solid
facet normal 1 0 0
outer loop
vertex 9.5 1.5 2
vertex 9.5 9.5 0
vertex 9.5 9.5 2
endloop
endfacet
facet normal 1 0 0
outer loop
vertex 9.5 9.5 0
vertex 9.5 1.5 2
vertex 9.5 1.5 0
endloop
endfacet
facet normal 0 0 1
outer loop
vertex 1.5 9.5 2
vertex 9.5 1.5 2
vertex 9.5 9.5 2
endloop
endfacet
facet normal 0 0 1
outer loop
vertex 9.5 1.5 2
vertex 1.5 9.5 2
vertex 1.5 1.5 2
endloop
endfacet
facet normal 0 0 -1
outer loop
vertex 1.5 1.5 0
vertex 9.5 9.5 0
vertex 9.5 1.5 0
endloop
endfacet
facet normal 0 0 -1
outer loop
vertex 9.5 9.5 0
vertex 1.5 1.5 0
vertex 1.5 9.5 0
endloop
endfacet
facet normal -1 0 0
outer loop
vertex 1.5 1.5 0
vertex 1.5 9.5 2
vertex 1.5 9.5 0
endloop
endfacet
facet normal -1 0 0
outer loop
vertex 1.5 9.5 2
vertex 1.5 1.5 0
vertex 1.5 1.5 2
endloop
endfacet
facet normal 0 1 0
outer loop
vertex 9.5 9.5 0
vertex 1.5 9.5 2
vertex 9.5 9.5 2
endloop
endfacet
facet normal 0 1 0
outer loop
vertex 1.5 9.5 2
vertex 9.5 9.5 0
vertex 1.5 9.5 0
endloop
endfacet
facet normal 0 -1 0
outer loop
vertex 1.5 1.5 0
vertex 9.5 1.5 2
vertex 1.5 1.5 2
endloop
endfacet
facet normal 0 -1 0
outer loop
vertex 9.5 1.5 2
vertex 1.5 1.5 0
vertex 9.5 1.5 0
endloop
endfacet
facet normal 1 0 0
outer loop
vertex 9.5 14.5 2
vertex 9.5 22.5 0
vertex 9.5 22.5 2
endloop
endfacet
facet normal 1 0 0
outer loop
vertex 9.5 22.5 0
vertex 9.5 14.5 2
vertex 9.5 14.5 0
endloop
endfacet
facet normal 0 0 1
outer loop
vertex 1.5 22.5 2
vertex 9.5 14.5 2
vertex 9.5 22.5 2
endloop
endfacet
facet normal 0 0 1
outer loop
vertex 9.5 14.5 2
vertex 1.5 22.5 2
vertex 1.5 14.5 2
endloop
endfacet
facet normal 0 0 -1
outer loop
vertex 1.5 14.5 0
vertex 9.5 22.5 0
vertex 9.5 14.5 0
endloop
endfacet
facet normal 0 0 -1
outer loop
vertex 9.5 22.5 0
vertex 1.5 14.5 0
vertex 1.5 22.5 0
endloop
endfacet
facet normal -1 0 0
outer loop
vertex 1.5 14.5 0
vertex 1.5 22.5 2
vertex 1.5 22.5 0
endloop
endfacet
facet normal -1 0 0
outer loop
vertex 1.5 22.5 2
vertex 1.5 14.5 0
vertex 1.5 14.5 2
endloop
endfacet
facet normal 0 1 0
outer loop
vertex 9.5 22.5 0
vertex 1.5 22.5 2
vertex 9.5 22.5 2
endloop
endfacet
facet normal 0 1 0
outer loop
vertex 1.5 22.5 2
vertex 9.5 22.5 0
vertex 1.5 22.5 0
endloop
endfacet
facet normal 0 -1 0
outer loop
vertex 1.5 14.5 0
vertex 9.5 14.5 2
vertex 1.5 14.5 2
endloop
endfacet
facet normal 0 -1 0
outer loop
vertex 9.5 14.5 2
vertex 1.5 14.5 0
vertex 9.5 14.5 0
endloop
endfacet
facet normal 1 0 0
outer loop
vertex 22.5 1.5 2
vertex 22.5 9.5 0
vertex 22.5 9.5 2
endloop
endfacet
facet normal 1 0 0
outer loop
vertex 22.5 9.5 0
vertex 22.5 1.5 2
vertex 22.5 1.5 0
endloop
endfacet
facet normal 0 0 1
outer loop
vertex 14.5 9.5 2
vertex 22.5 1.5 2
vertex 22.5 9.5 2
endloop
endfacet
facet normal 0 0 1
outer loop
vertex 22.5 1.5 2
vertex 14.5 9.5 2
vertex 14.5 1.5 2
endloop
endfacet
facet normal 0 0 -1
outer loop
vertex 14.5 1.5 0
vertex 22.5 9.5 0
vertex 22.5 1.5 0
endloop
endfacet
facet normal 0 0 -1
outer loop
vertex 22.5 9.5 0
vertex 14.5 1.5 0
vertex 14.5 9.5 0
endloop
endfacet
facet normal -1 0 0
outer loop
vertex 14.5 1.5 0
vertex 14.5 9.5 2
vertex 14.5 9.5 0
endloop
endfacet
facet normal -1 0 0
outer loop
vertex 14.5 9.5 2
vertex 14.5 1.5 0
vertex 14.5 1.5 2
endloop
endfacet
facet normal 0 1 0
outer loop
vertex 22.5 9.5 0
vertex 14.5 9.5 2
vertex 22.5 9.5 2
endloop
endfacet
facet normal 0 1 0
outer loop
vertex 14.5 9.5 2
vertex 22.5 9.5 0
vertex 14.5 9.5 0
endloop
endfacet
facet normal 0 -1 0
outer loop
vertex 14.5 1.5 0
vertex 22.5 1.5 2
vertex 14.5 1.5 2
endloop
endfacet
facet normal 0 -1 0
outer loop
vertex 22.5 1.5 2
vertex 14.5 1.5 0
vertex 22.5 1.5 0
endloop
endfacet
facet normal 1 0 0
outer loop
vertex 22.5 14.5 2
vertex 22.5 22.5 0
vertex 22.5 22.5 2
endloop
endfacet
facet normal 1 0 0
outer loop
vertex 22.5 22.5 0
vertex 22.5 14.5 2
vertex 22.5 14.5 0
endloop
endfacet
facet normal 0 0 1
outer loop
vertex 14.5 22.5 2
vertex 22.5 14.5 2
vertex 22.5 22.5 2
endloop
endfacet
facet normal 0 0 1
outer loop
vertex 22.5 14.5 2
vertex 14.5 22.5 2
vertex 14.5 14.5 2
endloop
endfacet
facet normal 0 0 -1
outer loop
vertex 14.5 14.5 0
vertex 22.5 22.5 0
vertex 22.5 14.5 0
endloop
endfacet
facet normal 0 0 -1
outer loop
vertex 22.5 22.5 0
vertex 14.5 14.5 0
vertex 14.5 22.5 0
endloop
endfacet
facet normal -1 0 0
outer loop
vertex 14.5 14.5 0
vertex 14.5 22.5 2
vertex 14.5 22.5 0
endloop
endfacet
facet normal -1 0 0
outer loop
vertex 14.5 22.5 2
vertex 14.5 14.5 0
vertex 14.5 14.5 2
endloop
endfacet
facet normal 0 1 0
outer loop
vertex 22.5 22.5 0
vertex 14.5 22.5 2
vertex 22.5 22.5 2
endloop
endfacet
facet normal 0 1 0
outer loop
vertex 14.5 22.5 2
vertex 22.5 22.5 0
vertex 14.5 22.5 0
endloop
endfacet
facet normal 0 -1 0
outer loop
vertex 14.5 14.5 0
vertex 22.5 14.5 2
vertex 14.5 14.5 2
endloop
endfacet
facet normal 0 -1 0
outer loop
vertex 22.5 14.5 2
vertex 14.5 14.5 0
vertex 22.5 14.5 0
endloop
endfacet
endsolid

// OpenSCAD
// file: ../lib/util/util_functions.scad
include <../config/constants.scad>

function sum(v) = [for(p = v) 1] * v;

function take_sum(v, i) = i == 0 
  ? 0 
  : sum([for(a=[0:i-1]) v[a]]);

// input : nested list
// output : list with the outer level nesting removed
function flatten(outter_vector) = [for(inner_vector=outter_vector) for(item=inner_vector) item];
// file: ../lib/layout/layout.scad
include <../config/constants.scad>
include <../util/util_functions.scad>

function padded_rect(size) = size + (
  size[2] == undef
    ? [$padding * 2, $padding * 2]
    : [$padding * 2, $padding * 2, 0]
);

function padded_cube(size) = size + [$padding * 2, $padding * 2, $padding * 2];

function stack_height (length, count=1, top_padding=$top_padding) = length * count + top_padding;

function padded_offset (length, index=1) = (length + $padding * 2 + $wall_thickness) * index;

function offset (size, index=1) = (size + $wall_thickness) * index;

function pad(length) = length + $padding * 2;
function padded_list_length(list) = sum(
  [for(i=[0:len(list)-1]) list[i] + $padding * 2 + $wall_thickness]
) + $wall_thickness;

function divide_rect(rect, operand) = rect[2] == undef
  ? [rect[0] / operand, rect[1] / operand]
  : [rect[0] / operand, rect[1] / operand, rect[2]];

function multiply_rect(rect, operand) = [rect[0] * operand, rect[1] * operand];

function divide_cube(rect, operand) = [rect[0] / operand, rect[1] / operand, rec[2] / operand];
function multiply_cube(rect, operand) = [rect[0] * operand, rect[1] * operand, rect[2] * operand];

function offset_centre_in_box(size, bounding_box) = divide_rect(bounding_box - size, 2);

function spin_orientation_size(size, orientation=1) = orientation % 2 == 0
  ? size
  : [
    size[1],
    size[0],
    size[2],
  ];

// TODO add support for orientation 3
function spin_orientation_offset(size, orientation=1) = [
  orientation == 2 ? -size[0]: 0,
  orientation == 1 ? -size[0]: (orientation == 2 ? -size[1]: 0),
  0,
];

module spin_orientation(size, orientation=1) {
  assert(orientation >= 0, "Invalid orientation [0, 1, 2, 3] required");
  assert(orientation < 3, "Invalid orientation [0, 1, 2, 3] required");

  rotated_size = spin_orientation_size(size, orientation=1);
  degrees = 90 * orientation;
  spin_offset = spin_orientation_offset(size, orientation);

  rotate([0, 0, 90 * orientation]) {
    translate(spin_offset) {
      children();
    }
  }
}

module offset_cylinder(d, h) {
  translate([d / 2, d / 2, 0]) {
    cylinder(d=d, h=h);
  }
}

module offset_circle(d) {
  translate([d / 2, d / 2, 0]) {
    circle(d=d);
  }
}

module offset_square(size, center=false) {
  translate([size[0] / 2, size[1] / 2, 0]) {
    square(size, center=center);
  }
}
// file: ../lib/design/square-pattern.scad
include <../layout/layout.scad>

function spaced_offset(length, index, spacing) = (length + spacing) * index;

function inset_size(size, inset = 0, height = 0) = [
  pad(size[0] - inset * 2),
  pad(size[1] - inset * 2),
  height
];

module square_pattern(matrix, height, inset = 0, spacing = 0) {
  for (x=[0:len(matrix)-1]) {
    for (y=[0:len(matrix[x])-1]) {
      translate([
        spaced_offset(pad(matrix[x][y][0]), x, spacing) + inset,
        spaced_offset(pad(matrix[x][y][1]), y, spacing) + inset,
        0
      ]) {
        cube(inset_size(matrix[x][y], inset, height));
      }
    }
  }
}

module square_pattern_to_cut(matrix, height, inset, spacing) {
  translate([0, 0, - $bleed]) {
    square_pattern(matrix, height + $bleed * 2, inset, spacing);
  }
}
// file: ../lib/config/constants.scad
// Shared constants reflect things that are true for the whole model not just a single component.
// They should by definition be required by multiple components.
$fn = 10;

$abs_filament = false;

$wall_thickness = 2;
$floor_thickness = 2;
$wall_rect = [$wall_thickness, $wall_thickness];
$wall_cube = [$wall_thickness, $wall_thickness, $wall_thickness];
$inner_wall_thickness = 1;

$bleed = 0.01;

$padding = 0.5;
$top_padding = 0.2;
$padding_rect = [$padding * 2, $padding * 2];

$card_padding = 1.5;

$inset = 6;
$cutout_fraction = 0.6;

$rounding = 3;

$lid_height = 2;

$trapezoid_inset = 1;
// main file
include <../lib/config/constants.scad>
include <../lib/design/square-pattern.scad>

size = [
  10,
  10
];

matrix = [
  [size, size],
  [size, size],
];

inset = 1.5;

square_pattern(matrix, $wall_thickness, inset, $wall_thickness);

box_size = [
  30,
  30,
  $wall_thickness,
];
